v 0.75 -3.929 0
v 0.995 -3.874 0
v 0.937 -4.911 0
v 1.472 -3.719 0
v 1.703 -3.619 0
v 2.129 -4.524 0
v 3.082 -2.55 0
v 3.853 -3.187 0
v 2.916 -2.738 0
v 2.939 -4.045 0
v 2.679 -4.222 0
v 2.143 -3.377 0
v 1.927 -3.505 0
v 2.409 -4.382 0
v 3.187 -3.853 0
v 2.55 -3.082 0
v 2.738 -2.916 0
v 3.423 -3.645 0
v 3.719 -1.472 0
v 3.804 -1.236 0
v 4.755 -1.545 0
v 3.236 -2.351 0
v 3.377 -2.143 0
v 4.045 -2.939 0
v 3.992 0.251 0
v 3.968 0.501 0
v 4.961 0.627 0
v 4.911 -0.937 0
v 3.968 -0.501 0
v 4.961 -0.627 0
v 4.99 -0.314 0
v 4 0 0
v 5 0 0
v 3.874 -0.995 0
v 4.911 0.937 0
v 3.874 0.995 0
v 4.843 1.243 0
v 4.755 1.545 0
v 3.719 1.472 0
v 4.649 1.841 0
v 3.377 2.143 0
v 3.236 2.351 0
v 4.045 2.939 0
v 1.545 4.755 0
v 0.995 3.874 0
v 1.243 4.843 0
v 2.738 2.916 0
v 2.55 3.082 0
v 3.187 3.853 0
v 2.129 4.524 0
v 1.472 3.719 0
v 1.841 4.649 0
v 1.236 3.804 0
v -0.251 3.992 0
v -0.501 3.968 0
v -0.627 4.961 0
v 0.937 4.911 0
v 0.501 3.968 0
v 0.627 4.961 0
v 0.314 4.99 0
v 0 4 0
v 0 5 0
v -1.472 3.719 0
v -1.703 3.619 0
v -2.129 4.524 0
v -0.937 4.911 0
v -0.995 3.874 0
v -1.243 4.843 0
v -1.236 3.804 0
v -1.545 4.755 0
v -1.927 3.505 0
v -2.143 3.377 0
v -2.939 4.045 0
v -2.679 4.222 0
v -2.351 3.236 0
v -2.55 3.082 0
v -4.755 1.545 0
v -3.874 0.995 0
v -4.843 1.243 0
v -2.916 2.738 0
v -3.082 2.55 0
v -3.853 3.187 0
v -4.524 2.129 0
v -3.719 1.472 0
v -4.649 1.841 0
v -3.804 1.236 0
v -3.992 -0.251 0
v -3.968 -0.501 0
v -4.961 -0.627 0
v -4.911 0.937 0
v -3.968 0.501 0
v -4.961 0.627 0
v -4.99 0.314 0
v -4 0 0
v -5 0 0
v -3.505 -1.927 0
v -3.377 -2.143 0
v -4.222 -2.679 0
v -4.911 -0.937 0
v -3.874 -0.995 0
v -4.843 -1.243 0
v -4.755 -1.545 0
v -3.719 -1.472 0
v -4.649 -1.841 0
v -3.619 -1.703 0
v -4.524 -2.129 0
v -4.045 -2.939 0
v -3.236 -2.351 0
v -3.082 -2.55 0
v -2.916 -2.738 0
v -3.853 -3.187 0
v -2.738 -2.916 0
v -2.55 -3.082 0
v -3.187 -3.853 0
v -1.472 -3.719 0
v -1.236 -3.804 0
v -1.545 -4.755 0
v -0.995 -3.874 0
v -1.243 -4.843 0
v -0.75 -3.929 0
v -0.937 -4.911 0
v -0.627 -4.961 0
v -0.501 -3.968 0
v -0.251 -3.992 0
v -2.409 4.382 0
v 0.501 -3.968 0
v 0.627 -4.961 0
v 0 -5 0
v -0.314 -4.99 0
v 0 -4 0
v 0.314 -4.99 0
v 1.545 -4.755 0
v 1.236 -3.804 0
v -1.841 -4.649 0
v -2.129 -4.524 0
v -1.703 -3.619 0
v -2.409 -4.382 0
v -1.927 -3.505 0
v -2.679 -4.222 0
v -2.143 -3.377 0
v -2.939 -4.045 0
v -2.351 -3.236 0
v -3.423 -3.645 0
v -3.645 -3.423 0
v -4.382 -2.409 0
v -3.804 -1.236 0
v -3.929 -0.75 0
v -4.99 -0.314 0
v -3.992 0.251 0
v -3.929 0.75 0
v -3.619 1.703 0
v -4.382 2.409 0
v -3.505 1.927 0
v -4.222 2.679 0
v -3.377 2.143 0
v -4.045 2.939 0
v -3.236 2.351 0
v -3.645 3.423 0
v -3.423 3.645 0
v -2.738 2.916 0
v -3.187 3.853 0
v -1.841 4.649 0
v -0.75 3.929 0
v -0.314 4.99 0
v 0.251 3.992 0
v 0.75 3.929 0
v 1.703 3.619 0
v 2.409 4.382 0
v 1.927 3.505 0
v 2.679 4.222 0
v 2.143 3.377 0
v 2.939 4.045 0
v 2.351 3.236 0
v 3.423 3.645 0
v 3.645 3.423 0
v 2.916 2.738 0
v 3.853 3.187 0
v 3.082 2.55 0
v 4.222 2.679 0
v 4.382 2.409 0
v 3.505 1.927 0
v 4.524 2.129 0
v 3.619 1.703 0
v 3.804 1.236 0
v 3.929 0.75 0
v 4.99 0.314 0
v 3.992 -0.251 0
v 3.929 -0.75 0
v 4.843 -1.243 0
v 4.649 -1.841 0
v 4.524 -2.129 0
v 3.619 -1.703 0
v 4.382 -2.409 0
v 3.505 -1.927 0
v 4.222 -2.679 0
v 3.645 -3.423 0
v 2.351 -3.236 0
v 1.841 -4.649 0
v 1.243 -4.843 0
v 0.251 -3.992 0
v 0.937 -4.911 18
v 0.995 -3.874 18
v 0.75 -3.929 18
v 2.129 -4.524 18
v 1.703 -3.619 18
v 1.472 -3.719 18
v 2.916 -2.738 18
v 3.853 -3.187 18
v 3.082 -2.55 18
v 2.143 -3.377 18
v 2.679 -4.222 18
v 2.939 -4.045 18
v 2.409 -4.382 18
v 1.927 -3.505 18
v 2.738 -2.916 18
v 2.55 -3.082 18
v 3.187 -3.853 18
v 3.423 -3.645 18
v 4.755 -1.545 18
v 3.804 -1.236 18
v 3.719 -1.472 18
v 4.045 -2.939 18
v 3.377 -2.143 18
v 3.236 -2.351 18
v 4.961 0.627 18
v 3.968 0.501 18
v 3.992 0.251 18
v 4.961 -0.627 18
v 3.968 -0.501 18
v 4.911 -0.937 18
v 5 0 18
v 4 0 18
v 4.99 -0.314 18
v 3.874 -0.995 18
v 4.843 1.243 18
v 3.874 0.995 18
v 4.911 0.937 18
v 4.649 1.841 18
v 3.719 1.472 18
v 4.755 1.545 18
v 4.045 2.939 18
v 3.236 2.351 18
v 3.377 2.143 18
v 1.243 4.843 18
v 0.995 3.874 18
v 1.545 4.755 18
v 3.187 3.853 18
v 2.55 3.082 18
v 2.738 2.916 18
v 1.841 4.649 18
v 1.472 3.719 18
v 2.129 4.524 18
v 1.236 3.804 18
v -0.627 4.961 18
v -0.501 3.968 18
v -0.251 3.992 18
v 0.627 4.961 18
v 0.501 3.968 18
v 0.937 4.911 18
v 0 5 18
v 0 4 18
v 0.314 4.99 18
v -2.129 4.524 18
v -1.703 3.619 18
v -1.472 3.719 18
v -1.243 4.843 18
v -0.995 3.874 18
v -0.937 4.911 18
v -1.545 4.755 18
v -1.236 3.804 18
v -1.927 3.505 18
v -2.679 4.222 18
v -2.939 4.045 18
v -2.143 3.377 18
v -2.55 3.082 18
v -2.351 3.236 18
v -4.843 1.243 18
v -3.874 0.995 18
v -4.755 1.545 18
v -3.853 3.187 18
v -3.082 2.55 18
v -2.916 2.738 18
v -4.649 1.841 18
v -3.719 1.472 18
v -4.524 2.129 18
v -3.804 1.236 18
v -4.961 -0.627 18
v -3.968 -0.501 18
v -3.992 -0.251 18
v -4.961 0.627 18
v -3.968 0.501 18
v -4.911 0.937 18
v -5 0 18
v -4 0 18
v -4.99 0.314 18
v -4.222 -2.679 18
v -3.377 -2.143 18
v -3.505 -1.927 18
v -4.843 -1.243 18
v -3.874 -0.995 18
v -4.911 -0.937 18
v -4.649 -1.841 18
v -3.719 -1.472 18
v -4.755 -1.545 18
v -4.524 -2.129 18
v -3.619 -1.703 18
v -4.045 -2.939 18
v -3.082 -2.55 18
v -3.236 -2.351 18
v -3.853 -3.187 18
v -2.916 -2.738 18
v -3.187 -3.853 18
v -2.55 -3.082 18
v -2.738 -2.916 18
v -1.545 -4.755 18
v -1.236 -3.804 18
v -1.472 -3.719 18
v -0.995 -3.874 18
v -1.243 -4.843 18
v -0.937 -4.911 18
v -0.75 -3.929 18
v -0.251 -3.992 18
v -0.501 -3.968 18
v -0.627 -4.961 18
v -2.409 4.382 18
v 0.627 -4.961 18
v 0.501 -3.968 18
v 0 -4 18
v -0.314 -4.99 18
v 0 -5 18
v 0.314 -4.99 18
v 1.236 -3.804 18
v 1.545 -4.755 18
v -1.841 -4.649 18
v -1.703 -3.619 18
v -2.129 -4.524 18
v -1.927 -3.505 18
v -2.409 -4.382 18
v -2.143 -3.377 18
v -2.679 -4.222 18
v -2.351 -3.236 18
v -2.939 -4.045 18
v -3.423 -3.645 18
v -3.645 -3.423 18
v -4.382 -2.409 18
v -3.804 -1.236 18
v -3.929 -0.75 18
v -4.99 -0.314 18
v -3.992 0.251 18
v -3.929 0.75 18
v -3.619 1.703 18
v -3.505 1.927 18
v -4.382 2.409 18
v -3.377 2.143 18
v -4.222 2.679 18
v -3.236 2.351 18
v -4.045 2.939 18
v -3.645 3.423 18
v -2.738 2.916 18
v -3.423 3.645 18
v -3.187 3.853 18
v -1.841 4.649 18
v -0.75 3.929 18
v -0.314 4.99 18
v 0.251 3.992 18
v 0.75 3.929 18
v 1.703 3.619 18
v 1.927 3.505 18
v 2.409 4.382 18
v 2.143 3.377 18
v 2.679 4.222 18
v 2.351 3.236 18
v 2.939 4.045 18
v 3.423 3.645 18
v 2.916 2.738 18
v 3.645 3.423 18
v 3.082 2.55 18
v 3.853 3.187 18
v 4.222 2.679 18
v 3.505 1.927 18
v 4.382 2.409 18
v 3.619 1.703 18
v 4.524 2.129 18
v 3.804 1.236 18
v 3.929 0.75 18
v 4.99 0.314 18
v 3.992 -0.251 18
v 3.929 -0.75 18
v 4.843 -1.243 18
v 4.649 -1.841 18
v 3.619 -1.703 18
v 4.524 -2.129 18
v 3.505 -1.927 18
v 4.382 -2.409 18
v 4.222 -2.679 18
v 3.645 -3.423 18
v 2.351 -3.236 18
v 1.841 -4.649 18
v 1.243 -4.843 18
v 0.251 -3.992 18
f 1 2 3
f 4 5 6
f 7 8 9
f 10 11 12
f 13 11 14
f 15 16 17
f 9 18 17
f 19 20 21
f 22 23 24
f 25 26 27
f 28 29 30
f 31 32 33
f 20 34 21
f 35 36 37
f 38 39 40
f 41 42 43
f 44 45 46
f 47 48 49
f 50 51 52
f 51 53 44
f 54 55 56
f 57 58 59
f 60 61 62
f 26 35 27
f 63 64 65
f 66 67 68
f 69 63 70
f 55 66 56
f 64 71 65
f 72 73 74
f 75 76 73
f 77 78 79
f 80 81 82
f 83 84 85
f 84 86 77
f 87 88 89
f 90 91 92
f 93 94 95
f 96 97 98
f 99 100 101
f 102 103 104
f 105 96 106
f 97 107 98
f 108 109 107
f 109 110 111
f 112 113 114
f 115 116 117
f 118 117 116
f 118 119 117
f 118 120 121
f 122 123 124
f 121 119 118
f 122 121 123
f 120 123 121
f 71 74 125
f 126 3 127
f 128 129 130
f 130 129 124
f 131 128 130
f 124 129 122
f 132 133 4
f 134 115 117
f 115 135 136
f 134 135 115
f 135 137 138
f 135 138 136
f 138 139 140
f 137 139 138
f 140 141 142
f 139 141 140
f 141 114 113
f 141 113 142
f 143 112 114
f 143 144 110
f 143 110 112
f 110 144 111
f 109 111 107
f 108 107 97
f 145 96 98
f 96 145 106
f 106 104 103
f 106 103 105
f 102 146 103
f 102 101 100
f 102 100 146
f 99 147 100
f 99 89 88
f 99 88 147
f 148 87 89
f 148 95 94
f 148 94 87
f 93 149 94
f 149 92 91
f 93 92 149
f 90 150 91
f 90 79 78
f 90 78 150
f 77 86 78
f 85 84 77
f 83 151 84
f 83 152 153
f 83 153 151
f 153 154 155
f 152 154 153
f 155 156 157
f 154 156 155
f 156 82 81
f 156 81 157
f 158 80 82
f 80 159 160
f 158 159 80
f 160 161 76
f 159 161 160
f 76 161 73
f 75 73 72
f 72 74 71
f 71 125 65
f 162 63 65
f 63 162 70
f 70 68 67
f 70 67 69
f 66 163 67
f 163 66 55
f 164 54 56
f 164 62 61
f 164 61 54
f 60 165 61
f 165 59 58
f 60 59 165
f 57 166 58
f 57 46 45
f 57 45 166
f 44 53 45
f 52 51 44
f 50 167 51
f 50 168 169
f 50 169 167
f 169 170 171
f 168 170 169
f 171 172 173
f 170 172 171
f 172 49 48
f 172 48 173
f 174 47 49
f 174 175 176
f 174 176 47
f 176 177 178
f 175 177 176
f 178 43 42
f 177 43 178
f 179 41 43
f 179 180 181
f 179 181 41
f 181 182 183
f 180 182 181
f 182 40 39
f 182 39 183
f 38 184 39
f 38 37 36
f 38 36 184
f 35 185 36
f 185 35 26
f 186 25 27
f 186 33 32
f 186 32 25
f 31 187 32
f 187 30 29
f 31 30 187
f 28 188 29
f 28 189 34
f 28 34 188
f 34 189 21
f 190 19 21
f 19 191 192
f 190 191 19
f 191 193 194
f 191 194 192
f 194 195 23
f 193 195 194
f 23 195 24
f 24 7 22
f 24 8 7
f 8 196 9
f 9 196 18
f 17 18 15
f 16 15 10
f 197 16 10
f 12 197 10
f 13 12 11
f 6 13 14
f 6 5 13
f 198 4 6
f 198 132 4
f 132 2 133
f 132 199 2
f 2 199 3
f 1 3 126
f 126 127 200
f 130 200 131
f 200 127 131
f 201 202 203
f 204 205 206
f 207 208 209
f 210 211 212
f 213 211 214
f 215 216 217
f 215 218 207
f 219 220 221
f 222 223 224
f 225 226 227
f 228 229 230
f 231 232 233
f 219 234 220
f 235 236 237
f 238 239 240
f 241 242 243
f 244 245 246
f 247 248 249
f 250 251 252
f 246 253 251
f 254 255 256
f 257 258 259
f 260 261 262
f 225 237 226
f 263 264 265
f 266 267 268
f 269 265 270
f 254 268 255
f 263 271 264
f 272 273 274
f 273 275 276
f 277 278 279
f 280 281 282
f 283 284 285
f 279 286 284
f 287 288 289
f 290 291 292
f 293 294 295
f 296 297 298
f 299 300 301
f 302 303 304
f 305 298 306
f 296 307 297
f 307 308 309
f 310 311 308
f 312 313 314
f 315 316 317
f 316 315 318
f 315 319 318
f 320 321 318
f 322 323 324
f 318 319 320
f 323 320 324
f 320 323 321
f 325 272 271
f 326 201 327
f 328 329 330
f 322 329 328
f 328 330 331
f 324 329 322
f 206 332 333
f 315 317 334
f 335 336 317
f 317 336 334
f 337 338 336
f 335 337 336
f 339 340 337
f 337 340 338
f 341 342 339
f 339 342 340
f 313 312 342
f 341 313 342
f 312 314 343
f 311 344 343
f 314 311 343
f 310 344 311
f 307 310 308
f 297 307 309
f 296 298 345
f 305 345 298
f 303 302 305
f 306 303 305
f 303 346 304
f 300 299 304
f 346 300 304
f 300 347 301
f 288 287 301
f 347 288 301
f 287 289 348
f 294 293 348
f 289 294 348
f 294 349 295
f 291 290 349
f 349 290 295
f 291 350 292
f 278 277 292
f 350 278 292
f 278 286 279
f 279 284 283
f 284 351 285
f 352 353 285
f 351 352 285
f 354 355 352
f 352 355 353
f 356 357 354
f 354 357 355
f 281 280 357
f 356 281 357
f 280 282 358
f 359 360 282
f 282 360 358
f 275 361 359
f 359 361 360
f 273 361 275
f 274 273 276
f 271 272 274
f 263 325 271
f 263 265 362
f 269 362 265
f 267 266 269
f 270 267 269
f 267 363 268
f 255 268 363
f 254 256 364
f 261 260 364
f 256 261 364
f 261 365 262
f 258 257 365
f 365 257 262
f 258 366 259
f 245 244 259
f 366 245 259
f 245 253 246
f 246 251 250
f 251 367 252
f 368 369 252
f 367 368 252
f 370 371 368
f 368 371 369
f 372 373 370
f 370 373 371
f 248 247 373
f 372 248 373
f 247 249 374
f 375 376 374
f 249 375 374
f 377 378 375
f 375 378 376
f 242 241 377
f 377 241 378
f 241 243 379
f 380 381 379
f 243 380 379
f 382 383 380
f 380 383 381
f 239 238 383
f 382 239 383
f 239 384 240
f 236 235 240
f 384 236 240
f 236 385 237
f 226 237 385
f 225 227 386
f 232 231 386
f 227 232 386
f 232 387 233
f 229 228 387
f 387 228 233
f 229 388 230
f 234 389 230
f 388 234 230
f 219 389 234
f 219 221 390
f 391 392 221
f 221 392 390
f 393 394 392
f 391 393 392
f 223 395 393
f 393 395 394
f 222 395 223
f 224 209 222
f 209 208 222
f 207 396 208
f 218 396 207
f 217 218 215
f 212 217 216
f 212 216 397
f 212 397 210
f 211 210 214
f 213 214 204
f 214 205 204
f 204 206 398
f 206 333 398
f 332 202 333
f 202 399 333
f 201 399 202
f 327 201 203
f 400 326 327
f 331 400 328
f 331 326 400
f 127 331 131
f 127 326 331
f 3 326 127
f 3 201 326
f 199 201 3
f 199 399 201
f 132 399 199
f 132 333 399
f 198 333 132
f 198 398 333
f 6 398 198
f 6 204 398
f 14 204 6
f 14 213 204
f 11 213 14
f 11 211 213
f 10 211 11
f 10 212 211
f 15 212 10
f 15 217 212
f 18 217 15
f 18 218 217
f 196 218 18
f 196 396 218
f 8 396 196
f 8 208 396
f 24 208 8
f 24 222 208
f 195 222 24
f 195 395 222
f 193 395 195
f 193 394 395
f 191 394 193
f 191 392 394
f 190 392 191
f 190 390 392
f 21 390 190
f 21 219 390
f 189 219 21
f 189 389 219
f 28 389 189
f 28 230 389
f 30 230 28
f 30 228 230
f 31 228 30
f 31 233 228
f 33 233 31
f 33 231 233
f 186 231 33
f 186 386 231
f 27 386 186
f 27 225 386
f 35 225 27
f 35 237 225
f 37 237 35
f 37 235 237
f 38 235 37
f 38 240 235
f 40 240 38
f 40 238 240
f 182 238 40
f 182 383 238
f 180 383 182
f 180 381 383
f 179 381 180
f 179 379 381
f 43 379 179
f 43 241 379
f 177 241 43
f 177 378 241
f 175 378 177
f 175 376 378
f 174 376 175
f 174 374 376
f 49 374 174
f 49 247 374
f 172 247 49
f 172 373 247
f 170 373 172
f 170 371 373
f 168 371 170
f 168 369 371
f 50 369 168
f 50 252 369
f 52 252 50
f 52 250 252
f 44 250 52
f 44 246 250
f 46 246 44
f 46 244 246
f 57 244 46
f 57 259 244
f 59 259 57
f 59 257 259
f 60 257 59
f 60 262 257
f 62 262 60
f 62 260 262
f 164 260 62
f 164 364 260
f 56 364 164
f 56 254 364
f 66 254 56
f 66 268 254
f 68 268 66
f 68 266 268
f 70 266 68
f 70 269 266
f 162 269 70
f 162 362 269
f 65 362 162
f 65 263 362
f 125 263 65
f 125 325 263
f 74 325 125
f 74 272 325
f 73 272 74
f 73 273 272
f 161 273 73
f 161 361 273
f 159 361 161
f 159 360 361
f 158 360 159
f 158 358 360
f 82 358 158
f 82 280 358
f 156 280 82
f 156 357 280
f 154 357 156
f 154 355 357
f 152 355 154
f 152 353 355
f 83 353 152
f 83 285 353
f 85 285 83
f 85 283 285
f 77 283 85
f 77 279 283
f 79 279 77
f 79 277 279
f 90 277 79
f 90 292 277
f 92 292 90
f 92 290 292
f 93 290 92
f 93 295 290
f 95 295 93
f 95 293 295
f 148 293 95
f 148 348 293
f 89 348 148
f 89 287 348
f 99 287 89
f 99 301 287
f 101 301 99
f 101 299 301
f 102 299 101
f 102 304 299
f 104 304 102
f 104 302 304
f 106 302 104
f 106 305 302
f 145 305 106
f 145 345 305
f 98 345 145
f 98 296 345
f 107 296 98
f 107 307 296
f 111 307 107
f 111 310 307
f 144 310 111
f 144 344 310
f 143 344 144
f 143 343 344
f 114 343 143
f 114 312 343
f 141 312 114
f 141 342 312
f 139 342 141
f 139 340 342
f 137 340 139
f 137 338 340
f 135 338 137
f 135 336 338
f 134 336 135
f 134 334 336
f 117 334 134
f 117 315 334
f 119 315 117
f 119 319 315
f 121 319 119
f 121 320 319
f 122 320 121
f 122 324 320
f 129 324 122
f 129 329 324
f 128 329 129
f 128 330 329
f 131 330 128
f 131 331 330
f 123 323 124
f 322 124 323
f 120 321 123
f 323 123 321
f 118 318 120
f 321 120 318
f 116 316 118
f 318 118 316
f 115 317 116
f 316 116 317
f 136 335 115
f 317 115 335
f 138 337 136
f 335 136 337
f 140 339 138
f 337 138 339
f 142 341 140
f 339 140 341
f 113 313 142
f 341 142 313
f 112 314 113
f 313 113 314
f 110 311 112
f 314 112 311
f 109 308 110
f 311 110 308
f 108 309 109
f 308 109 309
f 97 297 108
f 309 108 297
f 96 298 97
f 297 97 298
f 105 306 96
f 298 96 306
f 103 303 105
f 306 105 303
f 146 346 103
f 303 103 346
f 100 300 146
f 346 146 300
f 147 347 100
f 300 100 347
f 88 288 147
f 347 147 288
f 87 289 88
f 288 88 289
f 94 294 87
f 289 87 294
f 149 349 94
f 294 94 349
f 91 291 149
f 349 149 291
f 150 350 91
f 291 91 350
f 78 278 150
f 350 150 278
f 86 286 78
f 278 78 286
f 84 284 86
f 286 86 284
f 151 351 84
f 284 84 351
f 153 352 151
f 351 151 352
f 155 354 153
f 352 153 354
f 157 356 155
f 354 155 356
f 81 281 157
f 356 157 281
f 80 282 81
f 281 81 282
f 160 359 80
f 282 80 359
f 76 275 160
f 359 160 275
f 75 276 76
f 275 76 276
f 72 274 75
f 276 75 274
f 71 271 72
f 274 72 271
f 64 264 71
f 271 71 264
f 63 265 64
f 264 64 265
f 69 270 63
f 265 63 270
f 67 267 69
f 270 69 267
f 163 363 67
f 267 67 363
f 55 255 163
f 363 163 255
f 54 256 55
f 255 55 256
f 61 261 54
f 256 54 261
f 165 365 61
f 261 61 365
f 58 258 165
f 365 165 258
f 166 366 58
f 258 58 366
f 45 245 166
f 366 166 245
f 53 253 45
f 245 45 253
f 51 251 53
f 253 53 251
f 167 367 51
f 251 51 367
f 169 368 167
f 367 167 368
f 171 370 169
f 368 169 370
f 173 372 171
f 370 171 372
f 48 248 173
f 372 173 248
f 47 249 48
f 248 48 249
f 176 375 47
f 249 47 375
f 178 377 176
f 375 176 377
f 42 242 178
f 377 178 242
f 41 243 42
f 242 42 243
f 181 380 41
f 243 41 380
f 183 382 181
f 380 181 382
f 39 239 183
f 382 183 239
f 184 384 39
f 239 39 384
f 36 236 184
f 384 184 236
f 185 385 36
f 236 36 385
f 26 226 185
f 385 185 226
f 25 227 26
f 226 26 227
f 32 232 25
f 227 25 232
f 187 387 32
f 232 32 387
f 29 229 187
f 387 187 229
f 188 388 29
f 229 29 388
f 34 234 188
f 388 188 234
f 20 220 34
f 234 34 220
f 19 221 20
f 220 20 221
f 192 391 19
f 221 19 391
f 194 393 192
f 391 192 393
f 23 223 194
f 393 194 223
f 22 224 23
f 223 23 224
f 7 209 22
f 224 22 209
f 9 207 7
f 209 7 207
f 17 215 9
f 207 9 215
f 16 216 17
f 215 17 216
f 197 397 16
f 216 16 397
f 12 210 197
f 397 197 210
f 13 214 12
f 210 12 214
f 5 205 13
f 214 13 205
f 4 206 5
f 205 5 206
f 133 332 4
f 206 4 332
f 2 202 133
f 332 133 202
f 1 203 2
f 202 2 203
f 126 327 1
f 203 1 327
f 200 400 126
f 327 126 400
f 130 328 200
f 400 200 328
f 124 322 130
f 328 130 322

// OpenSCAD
linear_extrude(18) difference() {
	circle(d = 10, $fn = 100);
	circle(d = 8, $fn = 100);
}
